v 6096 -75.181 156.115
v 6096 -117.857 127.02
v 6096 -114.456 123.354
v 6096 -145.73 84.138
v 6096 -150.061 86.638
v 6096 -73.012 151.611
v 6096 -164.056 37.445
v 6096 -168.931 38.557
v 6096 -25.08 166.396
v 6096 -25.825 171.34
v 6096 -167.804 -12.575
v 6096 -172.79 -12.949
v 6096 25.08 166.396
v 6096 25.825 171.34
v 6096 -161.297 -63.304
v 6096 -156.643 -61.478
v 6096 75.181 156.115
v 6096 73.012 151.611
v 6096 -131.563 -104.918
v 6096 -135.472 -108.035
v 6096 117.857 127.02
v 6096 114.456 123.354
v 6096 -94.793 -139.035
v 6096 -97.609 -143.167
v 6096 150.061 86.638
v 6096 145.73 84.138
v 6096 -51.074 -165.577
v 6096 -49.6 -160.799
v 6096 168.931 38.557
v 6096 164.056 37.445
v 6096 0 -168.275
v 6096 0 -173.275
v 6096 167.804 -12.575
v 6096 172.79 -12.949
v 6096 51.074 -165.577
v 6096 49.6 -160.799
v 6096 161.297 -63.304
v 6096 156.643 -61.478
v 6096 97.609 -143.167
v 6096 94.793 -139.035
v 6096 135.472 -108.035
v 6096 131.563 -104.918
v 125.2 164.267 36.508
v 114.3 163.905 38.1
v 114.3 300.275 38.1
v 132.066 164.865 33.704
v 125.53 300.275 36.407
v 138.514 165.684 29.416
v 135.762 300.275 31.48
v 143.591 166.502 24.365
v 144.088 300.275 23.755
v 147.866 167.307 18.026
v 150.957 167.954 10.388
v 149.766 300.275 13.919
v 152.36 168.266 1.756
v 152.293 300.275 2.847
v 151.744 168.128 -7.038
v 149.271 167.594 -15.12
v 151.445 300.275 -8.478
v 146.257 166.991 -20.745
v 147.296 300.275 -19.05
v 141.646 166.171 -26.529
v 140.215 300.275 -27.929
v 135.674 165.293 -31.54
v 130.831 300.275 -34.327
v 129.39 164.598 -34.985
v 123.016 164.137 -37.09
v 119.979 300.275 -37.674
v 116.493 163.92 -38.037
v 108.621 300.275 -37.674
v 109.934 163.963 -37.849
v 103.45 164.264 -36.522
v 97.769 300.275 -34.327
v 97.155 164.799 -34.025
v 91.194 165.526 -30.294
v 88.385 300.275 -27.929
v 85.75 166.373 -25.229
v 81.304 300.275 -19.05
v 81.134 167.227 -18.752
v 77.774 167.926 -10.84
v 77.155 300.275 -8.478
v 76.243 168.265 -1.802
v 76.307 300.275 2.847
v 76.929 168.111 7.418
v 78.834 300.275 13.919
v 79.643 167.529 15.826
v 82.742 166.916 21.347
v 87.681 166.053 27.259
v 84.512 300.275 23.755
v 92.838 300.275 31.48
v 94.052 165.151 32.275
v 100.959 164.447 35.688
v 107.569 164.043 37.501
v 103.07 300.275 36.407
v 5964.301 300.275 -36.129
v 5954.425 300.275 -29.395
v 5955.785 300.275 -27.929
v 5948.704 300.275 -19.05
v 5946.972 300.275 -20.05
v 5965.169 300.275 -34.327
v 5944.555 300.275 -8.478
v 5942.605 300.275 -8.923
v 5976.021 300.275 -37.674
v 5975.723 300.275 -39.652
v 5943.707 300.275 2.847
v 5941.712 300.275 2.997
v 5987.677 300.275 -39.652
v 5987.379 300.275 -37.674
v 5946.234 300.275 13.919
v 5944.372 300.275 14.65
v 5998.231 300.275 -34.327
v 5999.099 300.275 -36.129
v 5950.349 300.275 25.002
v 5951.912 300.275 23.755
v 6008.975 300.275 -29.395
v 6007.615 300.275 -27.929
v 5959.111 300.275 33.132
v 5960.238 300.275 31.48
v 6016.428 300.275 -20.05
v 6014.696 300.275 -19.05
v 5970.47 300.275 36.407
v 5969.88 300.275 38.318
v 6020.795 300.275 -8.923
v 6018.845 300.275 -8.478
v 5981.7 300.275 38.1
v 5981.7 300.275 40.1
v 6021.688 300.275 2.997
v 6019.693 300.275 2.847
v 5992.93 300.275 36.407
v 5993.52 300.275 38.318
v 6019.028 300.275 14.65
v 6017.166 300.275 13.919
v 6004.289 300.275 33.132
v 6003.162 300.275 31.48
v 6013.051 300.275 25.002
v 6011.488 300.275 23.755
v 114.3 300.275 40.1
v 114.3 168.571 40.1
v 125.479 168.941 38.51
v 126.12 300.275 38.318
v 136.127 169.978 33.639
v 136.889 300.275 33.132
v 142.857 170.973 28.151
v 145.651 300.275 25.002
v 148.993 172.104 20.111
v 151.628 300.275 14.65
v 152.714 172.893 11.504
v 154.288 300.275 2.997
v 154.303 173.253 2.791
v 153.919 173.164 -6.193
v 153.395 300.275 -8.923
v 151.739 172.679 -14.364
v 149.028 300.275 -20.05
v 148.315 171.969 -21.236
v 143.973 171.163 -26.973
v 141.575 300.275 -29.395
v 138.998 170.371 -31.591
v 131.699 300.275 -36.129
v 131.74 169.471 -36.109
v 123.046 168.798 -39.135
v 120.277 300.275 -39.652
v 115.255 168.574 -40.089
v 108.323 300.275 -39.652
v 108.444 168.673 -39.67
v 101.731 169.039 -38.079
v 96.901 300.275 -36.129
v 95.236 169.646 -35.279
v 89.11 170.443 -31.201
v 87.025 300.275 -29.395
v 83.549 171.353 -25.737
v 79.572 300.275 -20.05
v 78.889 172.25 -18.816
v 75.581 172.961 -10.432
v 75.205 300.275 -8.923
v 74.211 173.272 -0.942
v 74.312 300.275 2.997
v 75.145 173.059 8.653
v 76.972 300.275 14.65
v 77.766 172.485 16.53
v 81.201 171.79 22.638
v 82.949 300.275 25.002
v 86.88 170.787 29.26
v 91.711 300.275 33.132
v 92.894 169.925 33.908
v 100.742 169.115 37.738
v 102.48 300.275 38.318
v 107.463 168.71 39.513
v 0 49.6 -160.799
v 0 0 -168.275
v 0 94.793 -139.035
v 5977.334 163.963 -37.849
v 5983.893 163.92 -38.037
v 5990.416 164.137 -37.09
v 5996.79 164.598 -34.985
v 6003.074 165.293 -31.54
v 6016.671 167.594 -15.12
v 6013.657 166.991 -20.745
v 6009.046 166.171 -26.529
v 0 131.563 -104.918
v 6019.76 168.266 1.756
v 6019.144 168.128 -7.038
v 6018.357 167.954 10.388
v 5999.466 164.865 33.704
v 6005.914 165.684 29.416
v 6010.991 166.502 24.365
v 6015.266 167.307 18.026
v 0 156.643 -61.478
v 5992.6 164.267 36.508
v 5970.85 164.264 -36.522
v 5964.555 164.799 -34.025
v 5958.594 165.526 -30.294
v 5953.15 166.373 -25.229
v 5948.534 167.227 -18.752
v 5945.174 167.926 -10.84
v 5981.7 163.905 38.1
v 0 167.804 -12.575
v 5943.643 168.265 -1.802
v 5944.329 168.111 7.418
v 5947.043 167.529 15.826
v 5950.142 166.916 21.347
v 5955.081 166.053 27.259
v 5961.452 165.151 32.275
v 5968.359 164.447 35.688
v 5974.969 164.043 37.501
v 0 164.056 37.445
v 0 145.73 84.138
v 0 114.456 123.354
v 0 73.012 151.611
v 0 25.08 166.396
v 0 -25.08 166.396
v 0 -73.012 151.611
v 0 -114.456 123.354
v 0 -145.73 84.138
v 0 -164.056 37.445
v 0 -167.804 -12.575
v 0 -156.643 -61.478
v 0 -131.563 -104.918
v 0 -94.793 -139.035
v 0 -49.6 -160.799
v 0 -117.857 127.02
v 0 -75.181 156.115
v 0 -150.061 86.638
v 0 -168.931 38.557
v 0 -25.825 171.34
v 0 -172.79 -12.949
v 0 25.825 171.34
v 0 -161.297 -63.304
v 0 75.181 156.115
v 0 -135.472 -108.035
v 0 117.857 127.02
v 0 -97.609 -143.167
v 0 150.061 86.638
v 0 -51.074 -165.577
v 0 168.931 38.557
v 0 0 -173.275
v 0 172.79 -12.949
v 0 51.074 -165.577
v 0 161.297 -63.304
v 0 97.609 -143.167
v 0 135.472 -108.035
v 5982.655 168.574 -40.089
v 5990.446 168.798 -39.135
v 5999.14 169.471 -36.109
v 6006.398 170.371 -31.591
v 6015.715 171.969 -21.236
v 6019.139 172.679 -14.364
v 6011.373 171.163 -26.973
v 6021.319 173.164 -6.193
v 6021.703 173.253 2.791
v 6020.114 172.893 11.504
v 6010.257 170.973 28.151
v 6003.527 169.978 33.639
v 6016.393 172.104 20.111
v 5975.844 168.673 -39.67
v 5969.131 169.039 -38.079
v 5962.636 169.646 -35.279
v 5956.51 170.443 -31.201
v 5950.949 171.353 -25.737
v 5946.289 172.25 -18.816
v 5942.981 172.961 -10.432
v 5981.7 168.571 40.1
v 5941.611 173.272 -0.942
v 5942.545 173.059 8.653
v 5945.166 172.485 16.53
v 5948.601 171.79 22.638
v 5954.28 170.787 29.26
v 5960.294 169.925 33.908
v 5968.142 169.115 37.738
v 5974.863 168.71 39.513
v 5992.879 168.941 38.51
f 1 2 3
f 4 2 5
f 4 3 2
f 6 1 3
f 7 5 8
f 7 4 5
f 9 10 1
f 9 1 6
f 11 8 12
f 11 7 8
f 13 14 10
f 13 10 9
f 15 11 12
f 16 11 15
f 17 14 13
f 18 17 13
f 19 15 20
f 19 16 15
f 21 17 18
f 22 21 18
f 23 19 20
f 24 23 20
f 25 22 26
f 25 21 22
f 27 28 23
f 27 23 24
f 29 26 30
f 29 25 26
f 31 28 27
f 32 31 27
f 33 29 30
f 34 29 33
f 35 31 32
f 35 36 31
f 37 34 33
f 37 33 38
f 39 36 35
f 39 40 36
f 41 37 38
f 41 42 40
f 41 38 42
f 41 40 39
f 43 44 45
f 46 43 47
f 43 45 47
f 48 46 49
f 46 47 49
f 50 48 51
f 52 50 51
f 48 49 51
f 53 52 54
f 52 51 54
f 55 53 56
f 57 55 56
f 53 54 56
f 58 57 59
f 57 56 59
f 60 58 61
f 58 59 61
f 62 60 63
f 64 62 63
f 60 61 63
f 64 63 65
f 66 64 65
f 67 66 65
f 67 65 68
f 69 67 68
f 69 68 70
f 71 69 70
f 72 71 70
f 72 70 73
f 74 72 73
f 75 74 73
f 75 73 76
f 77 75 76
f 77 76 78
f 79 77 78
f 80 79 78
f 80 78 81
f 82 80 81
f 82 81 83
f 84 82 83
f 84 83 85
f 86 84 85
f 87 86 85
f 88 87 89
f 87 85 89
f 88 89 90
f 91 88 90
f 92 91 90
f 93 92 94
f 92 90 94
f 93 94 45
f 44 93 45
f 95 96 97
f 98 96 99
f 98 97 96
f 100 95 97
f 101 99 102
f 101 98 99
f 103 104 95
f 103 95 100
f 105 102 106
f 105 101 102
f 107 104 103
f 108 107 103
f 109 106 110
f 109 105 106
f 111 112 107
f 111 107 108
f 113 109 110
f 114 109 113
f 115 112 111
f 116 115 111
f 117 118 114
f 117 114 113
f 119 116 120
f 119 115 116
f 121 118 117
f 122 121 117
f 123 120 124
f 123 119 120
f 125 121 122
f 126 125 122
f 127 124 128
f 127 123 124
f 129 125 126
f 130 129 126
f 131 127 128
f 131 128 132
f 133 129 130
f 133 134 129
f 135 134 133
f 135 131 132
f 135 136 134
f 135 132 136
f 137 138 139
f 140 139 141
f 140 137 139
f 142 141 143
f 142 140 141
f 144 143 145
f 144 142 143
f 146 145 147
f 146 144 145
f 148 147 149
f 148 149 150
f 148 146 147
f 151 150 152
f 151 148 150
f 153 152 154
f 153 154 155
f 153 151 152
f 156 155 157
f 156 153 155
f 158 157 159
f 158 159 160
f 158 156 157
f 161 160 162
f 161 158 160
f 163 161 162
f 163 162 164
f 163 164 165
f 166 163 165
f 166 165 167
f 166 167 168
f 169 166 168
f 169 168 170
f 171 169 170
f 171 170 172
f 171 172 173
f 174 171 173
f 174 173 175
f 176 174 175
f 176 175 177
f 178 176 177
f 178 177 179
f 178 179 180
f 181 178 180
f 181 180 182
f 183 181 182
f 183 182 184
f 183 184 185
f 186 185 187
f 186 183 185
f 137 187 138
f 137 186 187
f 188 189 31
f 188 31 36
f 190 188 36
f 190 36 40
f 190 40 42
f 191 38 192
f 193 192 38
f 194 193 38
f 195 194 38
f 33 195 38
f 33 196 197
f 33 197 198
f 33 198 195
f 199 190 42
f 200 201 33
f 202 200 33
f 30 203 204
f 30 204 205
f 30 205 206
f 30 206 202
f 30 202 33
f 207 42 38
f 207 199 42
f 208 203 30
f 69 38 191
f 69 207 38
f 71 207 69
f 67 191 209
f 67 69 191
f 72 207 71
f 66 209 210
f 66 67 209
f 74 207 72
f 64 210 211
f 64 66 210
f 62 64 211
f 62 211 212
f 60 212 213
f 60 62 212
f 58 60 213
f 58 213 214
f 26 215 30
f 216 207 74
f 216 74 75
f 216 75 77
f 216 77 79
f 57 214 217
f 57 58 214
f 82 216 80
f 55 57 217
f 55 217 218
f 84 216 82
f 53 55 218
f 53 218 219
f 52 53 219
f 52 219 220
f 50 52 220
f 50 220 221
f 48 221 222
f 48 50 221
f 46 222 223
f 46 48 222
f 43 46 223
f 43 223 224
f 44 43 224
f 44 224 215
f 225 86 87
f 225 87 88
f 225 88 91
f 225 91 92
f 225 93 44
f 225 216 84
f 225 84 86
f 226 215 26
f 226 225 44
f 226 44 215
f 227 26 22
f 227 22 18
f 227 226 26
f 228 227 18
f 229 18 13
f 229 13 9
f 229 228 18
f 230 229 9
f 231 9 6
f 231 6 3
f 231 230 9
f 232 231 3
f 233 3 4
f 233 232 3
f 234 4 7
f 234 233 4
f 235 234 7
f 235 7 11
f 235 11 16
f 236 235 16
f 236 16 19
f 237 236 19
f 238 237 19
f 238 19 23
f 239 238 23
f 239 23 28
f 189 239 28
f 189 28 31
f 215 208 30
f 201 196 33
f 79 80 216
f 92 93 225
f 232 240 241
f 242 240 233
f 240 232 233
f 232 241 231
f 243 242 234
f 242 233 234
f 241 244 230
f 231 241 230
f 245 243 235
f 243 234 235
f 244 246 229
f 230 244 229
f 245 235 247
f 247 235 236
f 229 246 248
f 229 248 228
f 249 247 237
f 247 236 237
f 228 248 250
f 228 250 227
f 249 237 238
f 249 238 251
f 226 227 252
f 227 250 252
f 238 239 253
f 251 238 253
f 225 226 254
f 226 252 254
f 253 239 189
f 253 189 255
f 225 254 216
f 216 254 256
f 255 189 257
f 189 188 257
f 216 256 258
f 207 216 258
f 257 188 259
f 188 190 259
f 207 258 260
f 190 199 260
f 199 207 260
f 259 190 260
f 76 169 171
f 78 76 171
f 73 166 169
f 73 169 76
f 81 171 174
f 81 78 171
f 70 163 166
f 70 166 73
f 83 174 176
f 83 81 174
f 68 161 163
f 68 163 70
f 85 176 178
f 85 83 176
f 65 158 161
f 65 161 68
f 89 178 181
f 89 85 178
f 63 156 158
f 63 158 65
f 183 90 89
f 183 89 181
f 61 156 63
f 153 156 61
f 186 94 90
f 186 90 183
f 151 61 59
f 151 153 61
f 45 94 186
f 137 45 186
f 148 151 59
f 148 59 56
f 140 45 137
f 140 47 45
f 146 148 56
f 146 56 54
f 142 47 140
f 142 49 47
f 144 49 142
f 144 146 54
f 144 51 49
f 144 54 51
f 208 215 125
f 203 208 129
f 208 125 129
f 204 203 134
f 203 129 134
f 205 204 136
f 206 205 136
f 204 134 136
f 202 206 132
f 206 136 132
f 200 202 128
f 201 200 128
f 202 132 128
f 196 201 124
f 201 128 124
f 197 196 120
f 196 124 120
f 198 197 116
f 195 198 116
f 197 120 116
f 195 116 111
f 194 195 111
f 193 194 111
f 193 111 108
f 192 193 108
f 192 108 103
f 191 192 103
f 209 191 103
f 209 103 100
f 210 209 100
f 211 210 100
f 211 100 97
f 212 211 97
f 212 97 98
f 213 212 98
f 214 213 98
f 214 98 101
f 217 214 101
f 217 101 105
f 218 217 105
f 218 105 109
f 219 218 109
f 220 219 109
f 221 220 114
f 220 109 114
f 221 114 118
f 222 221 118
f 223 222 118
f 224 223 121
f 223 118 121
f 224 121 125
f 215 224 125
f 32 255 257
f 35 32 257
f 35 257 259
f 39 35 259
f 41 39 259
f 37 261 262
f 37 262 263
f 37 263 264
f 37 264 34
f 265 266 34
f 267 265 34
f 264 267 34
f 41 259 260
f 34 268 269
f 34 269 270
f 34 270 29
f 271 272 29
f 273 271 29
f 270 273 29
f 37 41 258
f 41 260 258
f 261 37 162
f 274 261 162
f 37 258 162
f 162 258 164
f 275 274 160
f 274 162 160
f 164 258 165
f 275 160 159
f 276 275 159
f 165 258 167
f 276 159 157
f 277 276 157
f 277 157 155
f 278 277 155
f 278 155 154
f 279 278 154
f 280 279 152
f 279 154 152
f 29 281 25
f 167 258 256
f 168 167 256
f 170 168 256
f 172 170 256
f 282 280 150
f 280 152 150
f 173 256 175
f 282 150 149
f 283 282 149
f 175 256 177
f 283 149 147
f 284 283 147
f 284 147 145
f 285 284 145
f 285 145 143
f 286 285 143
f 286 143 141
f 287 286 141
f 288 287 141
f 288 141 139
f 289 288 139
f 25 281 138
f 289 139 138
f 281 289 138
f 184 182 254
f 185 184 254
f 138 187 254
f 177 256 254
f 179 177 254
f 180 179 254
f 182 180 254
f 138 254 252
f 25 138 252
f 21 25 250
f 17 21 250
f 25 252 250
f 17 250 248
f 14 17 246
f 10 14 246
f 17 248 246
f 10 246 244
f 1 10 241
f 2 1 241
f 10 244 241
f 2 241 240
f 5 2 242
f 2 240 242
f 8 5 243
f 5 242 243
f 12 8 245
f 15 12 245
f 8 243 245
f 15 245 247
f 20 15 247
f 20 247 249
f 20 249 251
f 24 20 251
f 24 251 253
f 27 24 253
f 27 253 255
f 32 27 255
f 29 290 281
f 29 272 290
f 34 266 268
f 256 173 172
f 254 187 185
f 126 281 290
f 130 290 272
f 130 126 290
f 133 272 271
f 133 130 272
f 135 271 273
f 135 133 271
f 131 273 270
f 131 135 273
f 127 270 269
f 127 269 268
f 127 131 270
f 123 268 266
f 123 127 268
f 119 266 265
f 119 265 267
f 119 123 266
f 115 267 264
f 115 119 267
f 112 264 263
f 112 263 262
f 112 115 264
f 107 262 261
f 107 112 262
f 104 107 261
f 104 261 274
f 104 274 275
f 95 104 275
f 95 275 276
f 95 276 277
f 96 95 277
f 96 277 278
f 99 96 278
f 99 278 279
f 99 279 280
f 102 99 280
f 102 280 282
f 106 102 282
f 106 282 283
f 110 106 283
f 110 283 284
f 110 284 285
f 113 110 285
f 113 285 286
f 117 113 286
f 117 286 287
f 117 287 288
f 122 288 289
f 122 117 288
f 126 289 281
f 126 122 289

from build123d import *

# Parameters (mm, degrees)
SKETCH1_R                = 173.275
SKETCH1_R_2              = 168.275
BOSS_EXTRUDE1_DEPTH      = 6096
BOSS_EXTRUDE2_REACH      = 6118.82
BOSS_EXTRUDE2_END_RADIUS = 173.275
SKETCH3_R                = 40.1
CUT_EXTRUDE1_REACH       = 6118.82
CUT_EXTRUDE1_END_RADIUS  = 168.275
SKETCH4_R                = 38.1


with BuildPart() as part:
    # Sketch1 → Boss-Extrude1 (new body)
    with BuildSketch(Plane(origin=(0, 0, 0), x_dir=(0, 0, -1), z_dir=(1, 0, 0))):
        Circle(SKETCH1_R)
        Circle(SKETCH1_R_2, mode=Mode.SUBTRACT)
    extrude(amount=BOSS_EXTRUDE1_DEPTH)

    # Boss-Extrude2: up to this cylinder (the profile starts outside it)
    boss_extrude2_end = Plane(origin=(3048, 0, 0), z_dir=(-1, 0, 0)) * Cylinder(BOSS_EXTRUDE2_END_RADIUS, 18452.59, mode=Mode.PRIVATE)
    # Sketch3 → Boss-Extrude2 (add, up to the surface)
    with BuildSketch(Plane(origin=(0, 300.2750027, 0), x_dir=(1, 0, 0), z_dir=(0, 1, 0)), mode=Mode.PRIVATE) as boss_extrude2_sk1:
        with Locations(Location((114.3, 0, 0), (0, 0, 270))):
            Circle(SKETCH3_R)
    boss_extrude2_tool1 = extrude(boss_extrude2_sk1.sketch, amount=-BOSS_EXTRUDE2_REACH, mode=Mode.PRIVATE) - boss_extrude2_end
    add(boss_extrude2_tool1.solids().sort_by_distance((114.3, 300.275003, 0))[0])
    # Sketch3 → Boss-Extrude2 (add, up to the surface)
    with BuildSketch(Plane(origin=(0, 300.2750027, 0), x_dir=(1, 0, 0), z_dir=(0, 1, 0)), mode=Mode.PRIVATE) as boss_extrude2_sk2:
        with Locations(Location((5981.7, 0, 0), (0, 0, 270))):
            Circle(SKETCH3_R)
    boss_extrude2_tool2 = extrude(boss_extrude2_sk2.sketch, amount=-BOSS_EXTRUDE2_REACH, mode=Mode.PRIVATE) - boss_extrude2_end
    add(boss_extrude2_tool2.solids().sort_by_distance((5981.7, 300.275003, 0))[0])

    # Cut-Extrude1: up to this cylinder (the profile starts outside it)
    cut_extrude1_end = Plane(origin=(3048, 0, 0), z_dir=(-1, 0, 0)) * Cylinder(CUT_EXTRUDE1_END_RADIUS, 18442.59, mode=Mode.PRIVATE)
    # Sketch4 → Cut-Extrude1 (cut, up to the surface)
    with BuildSketch(Plane(origin=(0, 300.2750027, 0), x_dir=(1, 0, 0), z_dir=(0, 1, 0)), mode=Mode.PRIVATE) as cut_extrude1_sk1:
        with Locations(Location((114.3, 0, 0), (0, 0, 270))):
            Circle(SKETCH4_R)
    cut_extrude1_tool1 = extrude(cut_extrude1_sk1.sketch, amount=-CUT_EXTRUDE1_REACH, mode=Mode.PRIVATE) - cut_extrude1_end
    add(cut_extrude1_tool1.solids().sort_by_distance((114.3, 300.275003, 0))[0], mode=Mode.SUBTRACT)
    # Sketch4 → Cut-Extrude1 (cut, up to the surface)
    with BuildSketch(Plane(origin=(0, 300.2750027, 0), x_dir=(1, 0, 0), z_dir=(0, 1, 0)), mode=Mode.PRIVATE) as cut_extrude1_sk2:
        with Locations(Location((5981.7, 0, 0), (0, 0, 270))):
            Circle(SKETCH4_R)
    cut_extrude1_tool2 = extrude(cut_extrude1_sk2.sketch, amount=-CUT_EXTRUDE1_REACH, mode=Mode.PRIVATE) - cut_extrude1_end
    add(cut_extrude1_tool2.solids().sort_by_distance((5981.7, 300.275003, 0))[0], mode=Mode.SUBTRACT)


solid = part.part
